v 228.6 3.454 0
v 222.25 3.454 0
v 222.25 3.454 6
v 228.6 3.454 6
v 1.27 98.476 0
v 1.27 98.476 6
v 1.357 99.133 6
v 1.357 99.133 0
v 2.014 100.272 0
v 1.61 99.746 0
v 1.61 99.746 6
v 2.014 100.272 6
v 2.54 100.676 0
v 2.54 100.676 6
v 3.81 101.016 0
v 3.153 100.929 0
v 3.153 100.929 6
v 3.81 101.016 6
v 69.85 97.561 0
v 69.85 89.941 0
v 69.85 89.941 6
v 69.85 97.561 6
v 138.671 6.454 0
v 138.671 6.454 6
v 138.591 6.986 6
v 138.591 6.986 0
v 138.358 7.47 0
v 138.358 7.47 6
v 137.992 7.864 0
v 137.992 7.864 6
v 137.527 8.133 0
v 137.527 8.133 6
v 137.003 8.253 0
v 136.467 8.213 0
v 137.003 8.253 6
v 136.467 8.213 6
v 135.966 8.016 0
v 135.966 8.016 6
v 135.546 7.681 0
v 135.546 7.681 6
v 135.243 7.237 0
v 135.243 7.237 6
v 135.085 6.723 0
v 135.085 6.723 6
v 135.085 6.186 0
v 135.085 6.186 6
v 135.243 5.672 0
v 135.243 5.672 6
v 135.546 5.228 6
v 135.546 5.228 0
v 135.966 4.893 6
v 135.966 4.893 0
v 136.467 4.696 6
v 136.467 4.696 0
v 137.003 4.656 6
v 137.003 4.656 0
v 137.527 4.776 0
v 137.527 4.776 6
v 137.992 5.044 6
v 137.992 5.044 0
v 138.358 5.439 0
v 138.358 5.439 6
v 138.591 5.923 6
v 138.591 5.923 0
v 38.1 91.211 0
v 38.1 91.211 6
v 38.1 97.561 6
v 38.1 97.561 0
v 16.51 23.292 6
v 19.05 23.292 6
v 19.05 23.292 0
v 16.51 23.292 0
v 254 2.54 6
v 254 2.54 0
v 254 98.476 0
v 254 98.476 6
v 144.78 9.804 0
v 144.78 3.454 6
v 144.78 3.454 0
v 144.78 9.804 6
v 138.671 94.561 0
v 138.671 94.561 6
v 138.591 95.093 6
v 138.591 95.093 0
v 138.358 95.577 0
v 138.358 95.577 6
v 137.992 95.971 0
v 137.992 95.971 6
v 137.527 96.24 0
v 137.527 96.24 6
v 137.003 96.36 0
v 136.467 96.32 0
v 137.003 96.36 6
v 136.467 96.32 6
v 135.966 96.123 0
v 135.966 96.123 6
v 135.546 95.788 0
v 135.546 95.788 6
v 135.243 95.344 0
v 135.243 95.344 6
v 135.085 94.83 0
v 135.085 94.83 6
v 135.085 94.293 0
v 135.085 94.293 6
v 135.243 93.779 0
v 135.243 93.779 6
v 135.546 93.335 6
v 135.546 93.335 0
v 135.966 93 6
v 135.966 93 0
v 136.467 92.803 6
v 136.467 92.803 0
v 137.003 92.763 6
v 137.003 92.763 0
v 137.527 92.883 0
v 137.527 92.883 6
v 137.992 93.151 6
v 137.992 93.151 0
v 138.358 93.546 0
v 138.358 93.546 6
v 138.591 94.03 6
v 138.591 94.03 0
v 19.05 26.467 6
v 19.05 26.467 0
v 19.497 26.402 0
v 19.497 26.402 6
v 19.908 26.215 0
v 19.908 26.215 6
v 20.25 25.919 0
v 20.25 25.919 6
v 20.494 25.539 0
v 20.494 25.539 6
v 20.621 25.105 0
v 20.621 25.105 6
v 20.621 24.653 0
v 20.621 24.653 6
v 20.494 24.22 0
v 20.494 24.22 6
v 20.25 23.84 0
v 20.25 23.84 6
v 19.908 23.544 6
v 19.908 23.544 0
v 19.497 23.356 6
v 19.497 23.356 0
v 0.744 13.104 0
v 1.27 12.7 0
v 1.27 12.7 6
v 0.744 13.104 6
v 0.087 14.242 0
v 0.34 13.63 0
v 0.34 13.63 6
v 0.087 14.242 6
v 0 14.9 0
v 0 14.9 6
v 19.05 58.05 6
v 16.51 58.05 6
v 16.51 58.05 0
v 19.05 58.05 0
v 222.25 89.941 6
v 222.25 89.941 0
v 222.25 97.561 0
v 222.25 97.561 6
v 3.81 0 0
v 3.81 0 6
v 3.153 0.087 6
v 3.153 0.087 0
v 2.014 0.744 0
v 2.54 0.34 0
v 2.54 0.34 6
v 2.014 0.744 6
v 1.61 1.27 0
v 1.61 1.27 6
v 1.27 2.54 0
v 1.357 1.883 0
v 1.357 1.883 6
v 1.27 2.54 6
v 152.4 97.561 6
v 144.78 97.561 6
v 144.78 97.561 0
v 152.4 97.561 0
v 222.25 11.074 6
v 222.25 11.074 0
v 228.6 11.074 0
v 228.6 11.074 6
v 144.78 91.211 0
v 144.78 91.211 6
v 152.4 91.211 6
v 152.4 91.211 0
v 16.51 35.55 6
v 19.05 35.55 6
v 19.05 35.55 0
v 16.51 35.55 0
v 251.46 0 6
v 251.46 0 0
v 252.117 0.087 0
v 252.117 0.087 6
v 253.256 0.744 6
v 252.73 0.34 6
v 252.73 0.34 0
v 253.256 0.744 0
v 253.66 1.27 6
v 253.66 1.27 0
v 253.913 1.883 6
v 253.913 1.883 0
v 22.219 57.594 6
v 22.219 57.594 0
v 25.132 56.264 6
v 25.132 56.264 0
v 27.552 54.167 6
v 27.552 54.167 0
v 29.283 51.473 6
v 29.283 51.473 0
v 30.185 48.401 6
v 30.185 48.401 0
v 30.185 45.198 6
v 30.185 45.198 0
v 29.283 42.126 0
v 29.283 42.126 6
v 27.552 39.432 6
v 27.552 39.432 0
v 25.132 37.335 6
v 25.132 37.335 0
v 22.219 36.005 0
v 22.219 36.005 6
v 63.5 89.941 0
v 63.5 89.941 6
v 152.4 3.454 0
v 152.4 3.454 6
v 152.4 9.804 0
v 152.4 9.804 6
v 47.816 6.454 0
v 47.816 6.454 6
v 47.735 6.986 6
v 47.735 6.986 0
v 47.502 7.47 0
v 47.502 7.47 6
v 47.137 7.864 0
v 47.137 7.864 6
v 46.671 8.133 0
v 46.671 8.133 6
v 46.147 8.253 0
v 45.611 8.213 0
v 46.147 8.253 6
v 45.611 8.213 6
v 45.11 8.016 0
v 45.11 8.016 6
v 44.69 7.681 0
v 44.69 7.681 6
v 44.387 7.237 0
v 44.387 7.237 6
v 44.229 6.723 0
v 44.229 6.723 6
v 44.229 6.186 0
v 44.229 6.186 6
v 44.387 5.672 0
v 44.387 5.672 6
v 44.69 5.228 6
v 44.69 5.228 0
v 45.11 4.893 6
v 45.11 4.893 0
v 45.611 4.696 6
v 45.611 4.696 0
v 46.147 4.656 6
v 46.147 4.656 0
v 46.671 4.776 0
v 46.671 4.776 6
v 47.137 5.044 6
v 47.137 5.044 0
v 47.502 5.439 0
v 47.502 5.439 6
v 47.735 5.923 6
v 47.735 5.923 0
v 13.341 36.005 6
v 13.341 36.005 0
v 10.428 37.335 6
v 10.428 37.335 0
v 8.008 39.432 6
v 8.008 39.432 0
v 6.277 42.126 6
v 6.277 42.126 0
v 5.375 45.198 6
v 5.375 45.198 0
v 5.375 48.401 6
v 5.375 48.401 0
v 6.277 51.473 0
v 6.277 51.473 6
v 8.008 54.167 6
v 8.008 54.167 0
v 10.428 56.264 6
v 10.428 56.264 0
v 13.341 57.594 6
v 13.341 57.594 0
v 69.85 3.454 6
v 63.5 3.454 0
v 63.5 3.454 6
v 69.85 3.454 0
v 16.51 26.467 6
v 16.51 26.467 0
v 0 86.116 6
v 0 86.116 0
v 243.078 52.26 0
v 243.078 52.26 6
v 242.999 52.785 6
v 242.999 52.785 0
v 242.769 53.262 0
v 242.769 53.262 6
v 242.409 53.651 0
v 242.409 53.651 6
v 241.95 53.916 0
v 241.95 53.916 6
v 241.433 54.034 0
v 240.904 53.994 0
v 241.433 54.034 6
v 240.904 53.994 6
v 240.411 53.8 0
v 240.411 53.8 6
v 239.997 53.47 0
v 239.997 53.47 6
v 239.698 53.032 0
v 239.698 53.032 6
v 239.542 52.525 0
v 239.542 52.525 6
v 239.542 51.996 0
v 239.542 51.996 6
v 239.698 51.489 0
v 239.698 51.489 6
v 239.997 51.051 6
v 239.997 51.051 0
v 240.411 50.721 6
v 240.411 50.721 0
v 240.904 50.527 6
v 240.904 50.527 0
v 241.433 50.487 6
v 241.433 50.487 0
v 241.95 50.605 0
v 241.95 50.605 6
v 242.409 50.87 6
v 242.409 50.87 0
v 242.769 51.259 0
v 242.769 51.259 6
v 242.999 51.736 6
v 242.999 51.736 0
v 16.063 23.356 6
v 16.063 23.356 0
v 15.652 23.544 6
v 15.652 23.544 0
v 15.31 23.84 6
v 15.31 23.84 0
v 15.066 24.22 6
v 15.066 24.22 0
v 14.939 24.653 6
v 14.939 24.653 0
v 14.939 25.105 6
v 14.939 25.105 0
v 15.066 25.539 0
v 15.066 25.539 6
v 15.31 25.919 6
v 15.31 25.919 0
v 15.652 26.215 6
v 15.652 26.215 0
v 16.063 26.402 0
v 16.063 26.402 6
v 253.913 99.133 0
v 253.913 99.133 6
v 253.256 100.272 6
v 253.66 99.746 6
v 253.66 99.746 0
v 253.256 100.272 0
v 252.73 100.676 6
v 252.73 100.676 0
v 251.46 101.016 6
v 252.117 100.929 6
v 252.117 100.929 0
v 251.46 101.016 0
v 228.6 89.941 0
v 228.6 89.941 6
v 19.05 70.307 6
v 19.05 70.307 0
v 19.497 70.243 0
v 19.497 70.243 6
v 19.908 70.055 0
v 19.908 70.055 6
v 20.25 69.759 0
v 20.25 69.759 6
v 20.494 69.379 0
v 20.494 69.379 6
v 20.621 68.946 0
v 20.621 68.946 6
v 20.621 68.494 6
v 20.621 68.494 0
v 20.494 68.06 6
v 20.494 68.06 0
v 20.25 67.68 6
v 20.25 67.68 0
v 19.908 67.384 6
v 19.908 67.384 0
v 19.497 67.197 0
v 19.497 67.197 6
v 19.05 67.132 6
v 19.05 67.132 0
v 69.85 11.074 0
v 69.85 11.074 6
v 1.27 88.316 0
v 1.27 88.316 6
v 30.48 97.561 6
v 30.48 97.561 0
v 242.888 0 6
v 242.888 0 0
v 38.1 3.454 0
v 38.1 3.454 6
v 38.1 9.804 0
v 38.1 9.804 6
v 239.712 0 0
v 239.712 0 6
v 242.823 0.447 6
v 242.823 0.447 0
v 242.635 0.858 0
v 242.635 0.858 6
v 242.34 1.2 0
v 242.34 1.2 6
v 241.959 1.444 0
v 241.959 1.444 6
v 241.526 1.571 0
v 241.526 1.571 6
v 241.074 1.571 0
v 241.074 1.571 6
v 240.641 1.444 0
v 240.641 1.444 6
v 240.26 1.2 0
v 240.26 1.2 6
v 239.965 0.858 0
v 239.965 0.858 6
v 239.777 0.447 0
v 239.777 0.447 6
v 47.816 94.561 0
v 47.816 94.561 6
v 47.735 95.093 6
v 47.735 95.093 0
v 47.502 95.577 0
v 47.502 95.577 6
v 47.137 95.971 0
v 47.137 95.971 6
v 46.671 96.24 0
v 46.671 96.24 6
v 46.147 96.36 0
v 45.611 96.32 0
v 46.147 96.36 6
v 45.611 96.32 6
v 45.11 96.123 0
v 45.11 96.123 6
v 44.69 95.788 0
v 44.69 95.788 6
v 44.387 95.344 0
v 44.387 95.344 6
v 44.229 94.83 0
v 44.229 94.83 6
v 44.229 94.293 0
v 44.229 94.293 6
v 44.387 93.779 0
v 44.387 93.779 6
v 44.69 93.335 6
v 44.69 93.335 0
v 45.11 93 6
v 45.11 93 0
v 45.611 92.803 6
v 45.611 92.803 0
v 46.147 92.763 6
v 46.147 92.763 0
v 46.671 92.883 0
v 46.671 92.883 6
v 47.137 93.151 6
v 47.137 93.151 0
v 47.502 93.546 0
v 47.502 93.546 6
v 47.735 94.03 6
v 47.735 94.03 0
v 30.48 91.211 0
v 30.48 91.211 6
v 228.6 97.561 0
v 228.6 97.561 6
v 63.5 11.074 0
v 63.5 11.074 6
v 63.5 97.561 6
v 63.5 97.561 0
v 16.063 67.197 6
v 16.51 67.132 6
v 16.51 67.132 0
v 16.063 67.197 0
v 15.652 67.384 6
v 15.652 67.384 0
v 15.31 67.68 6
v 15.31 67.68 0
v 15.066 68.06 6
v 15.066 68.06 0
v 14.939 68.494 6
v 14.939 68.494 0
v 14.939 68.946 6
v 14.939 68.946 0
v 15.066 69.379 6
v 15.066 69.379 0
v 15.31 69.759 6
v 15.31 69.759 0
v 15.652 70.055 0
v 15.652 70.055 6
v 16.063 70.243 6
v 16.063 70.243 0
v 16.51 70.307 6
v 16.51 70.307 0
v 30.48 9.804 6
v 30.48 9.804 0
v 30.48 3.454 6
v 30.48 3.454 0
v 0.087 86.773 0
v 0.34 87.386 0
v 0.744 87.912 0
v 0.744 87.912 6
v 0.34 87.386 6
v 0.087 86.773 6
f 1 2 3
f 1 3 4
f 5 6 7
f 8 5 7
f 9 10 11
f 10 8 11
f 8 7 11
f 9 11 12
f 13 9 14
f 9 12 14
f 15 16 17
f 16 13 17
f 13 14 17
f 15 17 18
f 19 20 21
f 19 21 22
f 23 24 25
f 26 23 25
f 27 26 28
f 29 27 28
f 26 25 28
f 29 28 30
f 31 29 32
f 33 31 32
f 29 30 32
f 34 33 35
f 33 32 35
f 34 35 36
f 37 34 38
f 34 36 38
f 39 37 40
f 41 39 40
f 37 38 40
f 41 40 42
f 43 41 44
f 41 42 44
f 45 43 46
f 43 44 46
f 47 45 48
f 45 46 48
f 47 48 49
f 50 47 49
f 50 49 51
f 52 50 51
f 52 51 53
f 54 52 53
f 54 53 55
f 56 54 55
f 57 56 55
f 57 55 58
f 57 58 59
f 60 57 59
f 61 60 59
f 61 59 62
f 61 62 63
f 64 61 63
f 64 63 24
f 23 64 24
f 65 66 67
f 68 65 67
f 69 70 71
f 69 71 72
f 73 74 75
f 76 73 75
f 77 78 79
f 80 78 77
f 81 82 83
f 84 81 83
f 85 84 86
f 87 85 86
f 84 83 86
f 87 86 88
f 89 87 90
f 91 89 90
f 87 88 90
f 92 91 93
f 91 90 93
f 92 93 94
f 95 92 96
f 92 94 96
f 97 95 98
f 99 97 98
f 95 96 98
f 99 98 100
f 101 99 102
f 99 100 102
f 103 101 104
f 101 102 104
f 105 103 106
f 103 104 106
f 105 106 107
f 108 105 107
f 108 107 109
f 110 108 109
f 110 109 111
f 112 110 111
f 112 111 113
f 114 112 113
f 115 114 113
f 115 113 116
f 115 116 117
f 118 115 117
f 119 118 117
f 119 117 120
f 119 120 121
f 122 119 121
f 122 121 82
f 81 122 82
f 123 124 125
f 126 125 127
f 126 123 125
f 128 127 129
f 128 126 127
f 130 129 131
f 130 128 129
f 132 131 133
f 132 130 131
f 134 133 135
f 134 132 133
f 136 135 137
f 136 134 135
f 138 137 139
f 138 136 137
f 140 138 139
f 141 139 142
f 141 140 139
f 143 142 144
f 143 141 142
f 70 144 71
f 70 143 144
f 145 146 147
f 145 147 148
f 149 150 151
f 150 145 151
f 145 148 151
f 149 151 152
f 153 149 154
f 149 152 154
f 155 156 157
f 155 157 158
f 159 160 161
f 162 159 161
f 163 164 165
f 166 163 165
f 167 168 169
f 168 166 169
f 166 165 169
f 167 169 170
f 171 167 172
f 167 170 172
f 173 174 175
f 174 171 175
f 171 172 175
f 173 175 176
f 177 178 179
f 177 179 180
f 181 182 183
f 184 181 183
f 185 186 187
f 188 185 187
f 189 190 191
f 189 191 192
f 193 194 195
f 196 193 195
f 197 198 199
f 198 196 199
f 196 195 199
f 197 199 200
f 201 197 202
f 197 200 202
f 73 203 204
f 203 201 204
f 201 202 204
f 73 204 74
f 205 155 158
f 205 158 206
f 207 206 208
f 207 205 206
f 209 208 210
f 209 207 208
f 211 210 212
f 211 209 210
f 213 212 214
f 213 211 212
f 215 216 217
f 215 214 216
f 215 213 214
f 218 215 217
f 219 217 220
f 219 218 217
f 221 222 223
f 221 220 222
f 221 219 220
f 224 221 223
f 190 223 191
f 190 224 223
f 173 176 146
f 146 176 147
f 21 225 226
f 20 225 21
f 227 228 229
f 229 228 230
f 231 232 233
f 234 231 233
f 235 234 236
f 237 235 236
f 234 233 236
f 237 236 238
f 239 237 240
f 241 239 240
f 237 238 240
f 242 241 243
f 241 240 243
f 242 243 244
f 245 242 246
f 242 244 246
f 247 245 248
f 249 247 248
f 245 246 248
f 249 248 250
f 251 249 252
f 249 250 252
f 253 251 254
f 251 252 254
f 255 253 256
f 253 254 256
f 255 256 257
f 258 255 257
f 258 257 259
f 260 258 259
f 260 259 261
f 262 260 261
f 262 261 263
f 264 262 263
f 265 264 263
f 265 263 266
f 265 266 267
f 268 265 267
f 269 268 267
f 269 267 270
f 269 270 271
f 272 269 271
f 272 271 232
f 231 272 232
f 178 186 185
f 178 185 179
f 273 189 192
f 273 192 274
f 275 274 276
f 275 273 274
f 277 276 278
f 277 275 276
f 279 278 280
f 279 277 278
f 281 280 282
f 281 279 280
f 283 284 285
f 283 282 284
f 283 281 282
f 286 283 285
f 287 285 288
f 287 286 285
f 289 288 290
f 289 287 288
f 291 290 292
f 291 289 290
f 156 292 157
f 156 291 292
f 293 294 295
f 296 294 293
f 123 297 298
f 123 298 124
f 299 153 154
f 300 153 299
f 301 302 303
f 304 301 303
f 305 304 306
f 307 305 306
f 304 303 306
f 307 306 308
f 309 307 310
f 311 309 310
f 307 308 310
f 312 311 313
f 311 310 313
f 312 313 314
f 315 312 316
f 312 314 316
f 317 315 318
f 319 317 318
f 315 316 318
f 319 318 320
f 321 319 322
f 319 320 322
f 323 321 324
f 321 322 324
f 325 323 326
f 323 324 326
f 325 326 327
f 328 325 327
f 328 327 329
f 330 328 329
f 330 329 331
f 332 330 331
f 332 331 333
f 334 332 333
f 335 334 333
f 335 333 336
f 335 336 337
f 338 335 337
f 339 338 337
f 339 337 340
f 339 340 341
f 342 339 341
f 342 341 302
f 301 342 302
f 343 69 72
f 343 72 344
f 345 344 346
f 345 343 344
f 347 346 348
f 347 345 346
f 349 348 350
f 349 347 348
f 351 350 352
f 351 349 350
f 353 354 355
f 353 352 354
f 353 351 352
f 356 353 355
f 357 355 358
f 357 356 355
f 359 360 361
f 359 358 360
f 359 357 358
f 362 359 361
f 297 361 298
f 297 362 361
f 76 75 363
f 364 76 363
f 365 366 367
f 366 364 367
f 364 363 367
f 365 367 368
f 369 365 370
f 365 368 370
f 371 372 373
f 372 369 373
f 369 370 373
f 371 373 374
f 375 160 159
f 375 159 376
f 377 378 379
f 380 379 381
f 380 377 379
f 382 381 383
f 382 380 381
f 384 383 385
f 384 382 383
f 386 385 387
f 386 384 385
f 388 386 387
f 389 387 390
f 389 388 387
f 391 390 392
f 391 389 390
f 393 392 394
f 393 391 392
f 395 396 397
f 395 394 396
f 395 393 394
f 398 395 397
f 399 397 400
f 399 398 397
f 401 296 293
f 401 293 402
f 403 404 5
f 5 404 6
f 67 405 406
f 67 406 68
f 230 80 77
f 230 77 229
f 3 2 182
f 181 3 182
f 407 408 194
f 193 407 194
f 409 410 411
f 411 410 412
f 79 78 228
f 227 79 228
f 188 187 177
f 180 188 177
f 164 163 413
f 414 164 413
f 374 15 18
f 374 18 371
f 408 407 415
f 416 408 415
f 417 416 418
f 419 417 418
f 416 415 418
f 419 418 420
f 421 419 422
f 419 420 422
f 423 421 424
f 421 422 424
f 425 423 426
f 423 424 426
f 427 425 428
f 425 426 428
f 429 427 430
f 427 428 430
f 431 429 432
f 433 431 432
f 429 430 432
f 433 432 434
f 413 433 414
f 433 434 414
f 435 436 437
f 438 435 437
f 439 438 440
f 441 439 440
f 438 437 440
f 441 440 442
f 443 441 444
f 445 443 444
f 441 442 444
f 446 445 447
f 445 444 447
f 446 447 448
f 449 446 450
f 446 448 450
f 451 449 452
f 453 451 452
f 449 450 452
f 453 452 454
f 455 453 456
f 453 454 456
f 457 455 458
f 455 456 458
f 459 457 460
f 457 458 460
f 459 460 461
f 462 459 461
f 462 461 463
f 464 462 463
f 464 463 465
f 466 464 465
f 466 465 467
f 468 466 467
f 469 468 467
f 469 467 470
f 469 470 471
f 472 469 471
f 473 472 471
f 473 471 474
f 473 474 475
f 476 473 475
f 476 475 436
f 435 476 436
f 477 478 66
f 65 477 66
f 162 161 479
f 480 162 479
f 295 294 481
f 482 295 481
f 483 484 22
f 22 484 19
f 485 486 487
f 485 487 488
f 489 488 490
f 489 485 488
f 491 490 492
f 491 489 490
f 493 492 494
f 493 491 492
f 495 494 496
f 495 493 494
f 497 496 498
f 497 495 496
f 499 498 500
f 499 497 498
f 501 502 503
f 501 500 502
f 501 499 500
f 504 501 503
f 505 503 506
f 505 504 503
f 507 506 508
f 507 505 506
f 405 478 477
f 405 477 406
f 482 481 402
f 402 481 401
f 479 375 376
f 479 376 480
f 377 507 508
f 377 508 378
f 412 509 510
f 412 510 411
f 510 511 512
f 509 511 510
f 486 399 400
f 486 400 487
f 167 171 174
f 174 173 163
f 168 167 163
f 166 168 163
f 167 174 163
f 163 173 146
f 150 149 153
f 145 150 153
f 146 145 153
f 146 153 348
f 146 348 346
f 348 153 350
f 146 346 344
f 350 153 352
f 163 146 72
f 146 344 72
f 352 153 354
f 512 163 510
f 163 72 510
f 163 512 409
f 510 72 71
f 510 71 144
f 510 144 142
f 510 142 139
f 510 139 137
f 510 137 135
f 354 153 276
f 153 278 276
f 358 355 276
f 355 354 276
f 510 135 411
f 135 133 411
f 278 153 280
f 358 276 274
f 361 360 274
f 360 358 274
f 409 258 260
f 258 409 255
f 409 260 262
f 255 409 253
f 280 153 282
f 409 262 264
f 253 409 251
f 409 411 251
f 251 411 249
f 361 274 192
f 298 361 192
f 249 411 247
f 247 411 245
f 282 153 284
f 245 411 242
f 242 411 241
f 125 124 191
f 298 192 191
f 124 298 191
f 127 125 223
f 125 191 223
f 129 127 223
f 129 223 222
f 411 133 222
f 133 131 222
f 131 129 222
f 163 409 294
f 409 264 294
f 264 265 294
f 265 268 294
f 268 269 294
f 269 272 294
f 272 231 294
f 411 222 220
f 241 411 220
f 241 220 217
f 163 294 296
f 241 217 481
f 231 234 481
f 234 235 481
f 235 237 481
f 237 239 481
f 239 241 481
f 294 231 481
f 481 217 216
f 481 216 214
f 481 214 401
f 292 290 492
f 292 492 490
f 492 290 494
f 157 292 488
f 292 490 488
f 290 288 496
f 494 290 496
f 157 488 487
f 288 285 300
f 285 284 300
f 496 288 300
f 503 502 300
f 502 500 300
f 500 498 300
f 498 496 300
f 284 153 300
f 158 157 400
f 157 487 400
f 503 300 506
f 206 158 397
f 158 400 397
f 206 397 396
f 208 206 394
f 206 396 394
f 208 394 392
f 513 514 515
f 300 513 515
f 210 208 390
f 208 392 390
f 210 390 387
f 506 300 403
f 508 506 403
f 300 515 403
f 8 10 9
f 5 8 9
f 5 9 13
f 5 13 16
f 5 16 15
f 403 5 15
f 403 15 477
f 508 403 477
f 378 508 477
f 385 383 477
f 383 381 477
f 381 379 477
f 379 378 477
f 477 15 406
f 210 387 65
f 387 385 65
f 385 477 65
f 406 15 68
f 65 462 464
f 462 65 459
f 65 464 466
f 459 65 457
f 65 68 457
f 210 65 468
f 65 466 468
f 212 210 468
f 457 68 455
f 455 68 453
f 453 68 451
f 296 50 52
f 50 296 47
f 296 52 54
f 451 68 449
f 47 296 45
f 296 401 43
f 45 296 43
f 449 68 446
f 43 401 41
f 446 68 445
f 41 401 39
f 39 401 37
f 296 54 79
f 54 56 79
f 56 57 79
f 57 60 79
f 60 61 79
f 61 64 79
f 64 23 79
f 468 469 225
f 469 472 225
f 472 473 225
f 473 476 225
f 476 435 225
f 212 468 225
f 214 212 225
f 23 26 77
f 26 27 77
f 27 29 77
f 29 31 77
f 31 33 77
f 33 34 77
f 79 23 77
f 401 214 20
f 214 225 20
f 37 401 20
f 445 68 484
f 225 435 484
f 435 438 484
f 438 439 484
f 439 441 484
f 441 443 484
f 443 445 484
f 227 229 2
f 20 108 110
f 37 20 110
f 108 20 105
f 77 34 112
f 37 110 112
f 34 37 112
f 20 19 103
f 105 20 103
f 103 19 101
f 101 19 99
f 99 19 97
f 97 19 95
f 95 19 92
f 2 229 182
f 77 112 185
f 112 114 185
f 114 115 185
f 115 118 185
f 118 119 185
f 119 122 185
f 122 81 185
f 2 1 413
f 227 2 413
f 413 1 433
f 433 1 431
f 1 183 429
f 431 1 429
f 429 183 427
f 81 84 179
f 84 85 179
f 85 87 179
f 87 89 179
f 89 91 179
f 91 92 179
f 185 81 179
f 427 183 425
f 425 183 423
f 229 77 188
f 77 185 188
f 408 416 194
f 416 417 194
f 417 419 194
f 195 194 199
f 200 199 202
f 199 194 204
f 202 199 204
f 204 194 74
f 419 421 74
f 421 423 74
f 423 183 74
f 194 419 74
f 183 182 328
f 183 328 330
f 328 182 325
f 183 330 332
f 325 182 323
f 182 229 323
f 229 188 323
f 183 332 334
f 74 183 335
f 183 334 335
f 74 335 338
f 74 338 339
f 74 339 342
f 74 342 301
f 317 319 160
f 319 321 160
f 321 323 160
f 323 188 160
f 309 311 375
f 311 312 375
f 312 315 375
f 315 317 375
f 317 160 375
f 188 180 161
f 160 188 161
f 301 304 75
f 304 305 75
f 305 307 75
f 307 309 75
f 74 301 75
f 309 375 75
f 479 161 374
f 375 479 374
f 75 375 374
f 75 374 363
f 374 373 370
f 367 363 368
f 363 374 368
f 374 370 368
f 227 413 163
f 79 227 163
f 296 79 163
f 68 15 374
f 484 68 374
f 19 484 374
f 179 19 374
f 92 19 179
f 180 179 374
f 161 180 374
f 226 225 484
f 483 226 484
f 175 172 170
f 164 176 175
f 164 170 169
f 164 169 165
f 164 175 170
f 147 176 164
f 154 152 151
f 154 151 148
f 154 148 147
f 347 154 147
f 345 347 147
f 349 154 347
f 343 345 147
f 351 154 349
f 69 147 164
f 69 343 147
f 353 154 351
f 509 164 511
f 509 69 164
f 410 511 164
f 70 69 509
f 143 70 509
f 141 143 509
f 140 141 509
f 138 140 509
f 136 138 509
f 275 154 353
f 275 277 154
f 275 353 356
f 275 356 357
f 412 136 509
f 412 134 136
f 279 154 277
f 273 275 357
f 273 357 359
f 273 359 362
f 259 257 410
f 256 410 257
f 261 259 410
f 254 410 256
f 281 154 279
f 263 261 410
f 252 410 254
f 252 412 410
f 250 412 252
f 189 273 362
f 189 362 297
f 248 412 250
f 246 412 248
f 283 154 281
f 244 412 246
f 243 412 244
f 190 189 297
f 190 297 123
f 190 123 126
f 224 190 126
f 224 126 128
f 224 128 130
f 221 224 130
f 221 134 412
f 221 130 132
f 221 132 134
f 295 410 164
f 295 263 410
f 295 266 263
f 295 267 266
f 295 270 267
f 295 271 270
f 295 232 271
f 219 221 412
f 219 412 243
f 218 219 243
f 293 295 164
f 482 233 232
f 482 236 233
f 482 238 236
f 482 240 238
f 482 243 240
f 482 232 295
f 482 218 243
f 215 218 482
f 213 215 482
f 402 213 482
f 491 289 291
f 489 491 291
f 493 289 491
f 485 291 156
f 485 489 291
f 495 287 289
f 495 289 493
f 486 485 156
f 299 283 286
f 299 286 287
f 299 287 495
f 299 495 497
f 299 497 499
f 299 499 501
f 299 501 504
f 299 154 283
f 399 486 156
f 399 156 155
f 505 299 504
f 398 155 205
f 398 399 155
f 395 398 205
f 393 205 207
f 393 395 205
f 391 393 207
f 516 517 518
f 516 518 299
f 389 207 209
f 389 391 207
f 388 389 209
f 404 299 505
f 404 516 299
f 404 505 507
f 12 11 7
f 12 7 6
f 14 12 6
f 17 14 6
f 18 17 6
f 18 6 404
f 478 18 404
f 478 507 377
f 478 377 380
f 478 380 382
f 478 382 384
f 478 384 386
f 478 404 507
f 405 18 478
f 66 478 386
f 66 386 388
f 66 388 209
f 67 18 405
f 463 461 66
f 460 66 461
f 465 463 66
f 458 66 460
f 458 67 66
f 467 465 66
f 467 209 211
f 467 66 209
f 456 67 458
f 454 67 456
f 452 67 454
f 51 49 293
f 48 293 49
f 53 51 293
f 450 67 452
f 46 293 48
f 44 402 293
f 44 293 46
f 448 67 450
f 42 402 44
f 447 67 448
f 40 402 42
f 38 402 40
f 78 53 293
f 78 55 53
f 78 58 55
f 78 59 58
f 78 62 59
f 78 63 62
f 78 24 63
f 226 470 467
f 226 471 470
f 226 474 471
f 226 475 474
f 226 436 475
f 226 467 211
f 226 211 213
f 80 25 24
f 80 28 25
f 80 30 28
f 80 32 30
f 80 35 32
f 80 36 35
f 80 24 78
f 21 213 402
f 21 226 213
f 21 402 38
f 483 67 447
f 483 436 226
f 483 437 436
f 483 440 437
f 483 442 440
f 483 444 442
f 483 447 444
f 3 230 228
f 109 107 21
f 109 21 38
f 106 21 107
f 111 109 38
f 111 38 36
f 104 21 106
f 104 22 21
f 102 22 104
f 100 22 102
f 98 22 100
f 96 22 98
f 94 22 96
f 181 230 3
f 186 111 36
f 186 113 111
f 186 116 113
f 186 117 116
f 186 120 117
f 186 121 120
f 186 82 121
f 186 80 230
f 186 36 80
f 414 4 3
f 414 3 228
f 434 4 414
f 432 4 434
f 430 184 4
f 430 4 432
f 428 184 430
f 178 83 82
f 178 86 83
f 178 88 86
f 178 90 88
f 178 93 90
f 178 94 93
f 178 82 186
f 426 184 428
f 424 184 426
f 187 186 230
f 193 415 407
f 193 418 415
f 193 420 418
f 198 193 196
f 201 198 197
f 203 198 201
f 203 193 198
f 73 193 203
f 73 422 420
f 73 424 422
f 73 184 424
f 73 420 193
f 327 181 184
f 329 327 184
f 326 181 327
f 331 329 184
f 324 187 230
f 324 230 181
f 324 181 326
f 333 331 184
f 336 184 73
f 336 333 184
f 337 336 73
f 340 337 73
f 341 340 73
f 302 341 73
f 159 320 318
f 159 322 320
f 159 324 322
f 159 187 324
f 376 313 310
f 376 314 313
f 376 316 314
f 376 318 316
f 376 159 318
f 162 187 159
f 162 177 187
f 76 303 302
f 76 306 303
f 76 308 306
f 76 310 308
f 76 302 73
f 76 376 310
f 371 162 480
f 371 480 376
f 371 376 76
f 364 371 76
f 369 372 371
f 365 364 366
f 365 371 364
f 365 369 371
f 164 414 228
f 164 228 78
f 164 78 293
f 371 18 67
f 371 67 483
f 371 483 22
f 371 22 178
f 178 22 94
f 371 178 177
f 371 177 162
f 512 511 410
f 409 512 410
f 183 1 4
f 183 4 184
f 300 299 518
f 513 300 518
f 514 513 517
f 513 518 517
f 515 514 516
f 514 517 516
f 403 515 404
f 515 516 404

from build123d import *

# Parameters (mm, degrees)
SKETCH1_W           = 254
SKETCH1_H           = 101.0158
SKETCH1_W_2         = 6.35
SKETCH1_H_2         = 7.62
BOSS_EXTRUDE1_DEPTH = 6
SKETCH2_R           = 1.778
CUT_EXTRUDE1_DEPTH  = 274.415785663
SKETCH3_W           = 7.62
SKETCH3_H           = 6
CUT_EXTRUDE2_DEPTH  = 274.415785663
CUT_EXTRUDE3_REACH  = 275.416
SKETCH4_W           = 7.62
SKETCH4_H           = 0.35
SKETCH8_W           = 1.27
SKETCH8_H           = 12.7
CUT_EXTRUDE6_DEPTH  = 274.415785663
FILLET1_R           = 2.54
SKETCH6_R           = 1.8034
CUT_EXTRUDE4_DEPTH  = 274.415785663
SKETCH7_R           = 1.5875
CUT_EXTRUDE5_DEPTH  = 274.415785663


with BuildPart() as part:
    # Sketch1 → Boss-Extrude1 (new body)
    with BuildSketch(Plane.XY):
        with Locations((127, 50.5079)):
            Rectangle(SKETCH1_W, SKETCH1_H)
        with Locations((225.425, 93.7514)):
            Rectangle(SKETCH1_W_2, SKETCH1_H_2, mode=Mode.SUBTRACT)
        with Locations((66.675, 93.7514)):
            Rectangle(SKETCH1_W_2, SKETCH1_H_2, mode=Mode.SUBTRACT)
        with Locations((225.425, 7.2644)):
            Rectangle(SKETCH1_W_2, SKETCH1_H_2, mode=Mode.SUBTRACT)
        with Locations((66.675, 7.2644)):
            Rectangle(SKETCH1_W_2, SKETCH1_H_2, mode=Mode.SUBTRACT)
    extrude(amount=BOSS_EXTRUDE1_DEPTH)

    # Sketch2 → Cut-Extrude1 (cut, through all)
    with BuildSketch(Plane.XY.offset(6)):
        with Locations((241.3, 52.2605)):
            Circle(SKETCH2_R)
        with BuildLine():
            Line((16.51, 70.307310217), (19.05, 70.307310217))
            ThreePointArc((19.05, 70.307310217), (20.6375, 68.719810217), (19.05, 67.132310217))
            Line((19.05, 67.132310217), (16.51, 67.132310217))
            ThreePointArc((16.51, 67.132310217), (14.9225, 68.719810217), (16.51, 70.307310217))
        make_face()
        with BuildLine():
            Line((16.51, 26.466689783), (19.05, 26.466689783))
            ThreePointArc((19.05, 26.466689783), (20.6375, 24.879189783), (19.05, 23.291689783))
            Line((19.05, 23.291689783), (16.51, 23.291689783))
            ThreePointArc((16.51, 23.291689783), (14.9225, 24.879189783), (16.51, 26.466689783))
        make_face()
        with BuildLine():
            Line((16.51, 58.0495), (19.05, 58.0495))
            ThreePointArc((19.05, 58.0495), (30.3, 46.7995), (19.05, 35.5495))
            Line((19.05, 35.5495), (16.51, 35.5495))
            ThreePointArc((16.51, 35.5495), (5.26, 46.7995), (16.51, 58.0495))
        make_face()
    extrude(amount=-CUT_EXTRUDE1_DEPTH, mode=Mode.SUBTRACT)

    # Sketch3 → Cut-Extrude2 (cut, through all)
    with BuildSketch(Plane.XY.offset(6)):
        with Locations((34.29, 94.5614)):
            Rectangle(SKETCH3_W, SKETCH3_H)
        with Locations((148.59, 94.5614)):
            Rectangle(SKETCH3_W, SKETCH3_H)
        with Locations((148.59, 6.4544)):
            Rectangle(SKETCH3_W, SKETCH3_H)
        with Locations((34.29, 6.4544)):
            Rectangle(SKETCH3_W, SKETCH3_H)
    extrude(amount=-CUT_EXTRUDE2_DEPTH, mode=Mode.SUBTRACT)

    # Sketch4 → Cut-Extrude3 (cut, up to next)
    with BuildSketch(Plane.XY.offset(6), mode=Mode.PRIVATE) as cut_extrude3_sk1:
        with Locations((34.29, 91.3864)):
            Rectangle(SKETCH4_W, SKETCH4_H)
    cut_extrude3_tool1 = extrude(cut_extrude3_sk1.sketch, amount=-CUT_EXTRUDE3_REACH, mode=Mode.PRIVATE) & part.part
    # Sketch4 → Cut-Extrude3 (cut, up to next)
    with BuildSketch(Plane.XY.offset(6), mode=Mode.PRIVATE) as cut_extrude3_sk2:
        with Locations((34.29, 9.6294)):
            Rectangle(SKETCH4_W, SKETCH4_H)
    cut_extrude3_tool2 = extrude(cut_extrude3_sk2.sketch, amount=-CUT_EXTRUDE3_REACH, mode=Mode.PRIVATE) & part.part
    # Sketch4 → Cut-Extrude3 (cut, up to next)
    with BuildSketch(Plane.XY.offset(6), mode=Mode.PRIVATE) as cut_extrude3_sk3:
        with Locations((148.59, 91.3864)):
            Rectangle(SKETCH4_W, SKETCH4_H)
    cut_extrude3_tool3 = extrude(cut_extrude3_sk3.sketch, amount=-CUT_EXTRUDE3_REACH, mode=Mode.PRIVATE) & part.part
    # Sketch4 → Cut-Extrude3 (cut, up to next)
    with BuildSketch(Plane.XY.offset(6), mode=Mode.PRIVATE) as cut_extrude3_sk4:
        with Locations((148.59, 9.6294)):
            Rectangle(SKETCH4_W, SKETCH4_H)
    cut_extrude3_tool4 = extrude(cut_extrude3_sk4.sketch, amount=-CUT_EXTRUDE3_REACH, mode=Mode.PRIVATE) & part.part
    add(cut_extrude3_tool1.solids().sort_by_distance((34.29, 91.3864, 6))[0], mode=Mode.SUBTRACT)
    add(cut_extrude3_tool2.solids().sort_by_distance((34.29, 9.6294, 6))[0], mode=Mode.SUBTRACT)
    add(cut_extrude3_tool3.solids().sort_by_distance((148.59, 91.3864, 6))[0], mode=Mode.SUBTRACT)
    add(cut_extrude3_tool4.solids().sort_by_distance((148.59, 9.6294, 6))[0], mode=Mode.SUBTRACT)

    # Sketch8 → Cut-Extrude6 (cut, through all)
    with BuildSketch(Plane.XY.offset(6)):
        with Locations((0.635, 94.6658)):
            Rectangle(SKETCH8_W, SKETCH8_H)
        with Locations((0.635, 6.35)):
            Rectangle(SKETCH8_W, SKETCH8_H)
    extrude(amount=-CUT_EXTRUDE6_DEPTH, mode=Mode.SUBTRACT)

    # Fillet1
    # the kernel refuses this fillet: 2.54 mm, written as the material it takes off along each edge
    with BuildSketch(Plane(origin=(254, 0, -6.35), x_dir=(-1, 0, 0), z_dir=(0, 0, 1)), Plane(origin=(254, 101.0158, -6.35), x_dir=(0, -1, 0), z_dir=(0, 0, 1)), Plane(origin=(1.27, 0, 12.35), x_dir=(1, 0, 0), z_dir=(0, 0, -1)), Plane(origin=(1.27, 101.0158, 12.35), x_dir=(0, -1, 0), z_dir=(0, 0, -1))) as fillet1_piece_1:
        with BuildLine():
            CenterArc((FILLET1_R, -FILLET1_R), FILLET1_R, 90, 90)
            Line((0, -FILLET1_R), (-FILLET1_R * 0.02, -FILLET1_R))
            Line((-FILLET1_R * 0.02, -FILLET1_R), (-FILLET1_R * 0.02, FILLET1_R * 0.02))
            Line((-FILLET1_R * 0.02, FILLET1_R * 0.02), (FILLET1_R, FILLET1_R * 0.02))
            Line((FILLET1_R, FILLET1_R * 0.02), (FILLET1_R, 0))
        make_face()
    extrude(amount=18.7, mode=Mode.SUBTRACT)
    with BuildSketch(Plane(origin=(0, 88.3158, 11.499261314), x_dir=(0, -1, 0), z_dir=(0, 0, -1))) as fillet1_piece_2:
        with BuildLine():
            CenterArc((2.199704526, -2.54), FILLET1_R, 90, 60)
            Line((0, -1.27), (-0.043994091, -1.2446))
            ThreePointArc((-0.043994091, -1.2446), (-0.0508, -0.635), (-0.0508, 0))
            Line((-0.0508, 0), (0, 0.0508))
            Line((0, 0.0508), (2.199704526, 0.0508))
            Line((2.199704526, 0.0508), (2.199704526, 0))
        make_face()
    extrude(amount=16.998522628, mode=Mode.SUBTRACT)
    with BuildSketch(Plane(origin=(0, 12.7, 11.499261314), x_dir=(1, 0, 0), z_dir=(0, 0, -1))) as fillet1_piece_3:
        with BuildLine():
            CenterArc((2.54, -2.199704526), FILLET1_R, 120, 60)
            Line((0, -2.199704526), (-0.0508, -2.199704526))
            Line((-0.0508, -2.199704526), (-0.0508, 0))
            Line((-0.0508, 0), (0, 0.0508))
            ThreePointArc((0, 0.0508), (0.635, 0.0508), (1.2446, 0.043994091))
            Line((1.2446, 0.043994091), (1.27, 0))
        make_face()
    extrude(amount=16.998522628, mode=Mode.SUBTRACT)

    # Sketch6 → Cut-Extrude4 (cut, through all)
    with BuildSketch(Plane.XY.offset(6)):
        with Locations((46.0121, 6.4544)):
            Circle(SKETCH6_R)
        with Locations((136.8679, 6.4544)):
            Circle(SKETCH6_R)
        with Locations((46.0121, 94.5614)):
            Circle(SKETCH6_R)
        with Locations((136.8679, 94.5614)):
            Circle(SKETCH6_R)
    extrude(amount=-CUT_EXTRUDE4_DEPTH, mode=Mode.SUBTRACT)

    # Sketch7 → Cut-Extrude5 (cut, through all)
    with BuildSketch(Plane.XY.offset(6)):
        with Locations((241.3, 0)):
            Circle(SKETCH7_R)
    extrude(amount=-CUT_EXTRUDE5_DEPTH, mode=Mode.SUBTRACT)


solid = part.part
